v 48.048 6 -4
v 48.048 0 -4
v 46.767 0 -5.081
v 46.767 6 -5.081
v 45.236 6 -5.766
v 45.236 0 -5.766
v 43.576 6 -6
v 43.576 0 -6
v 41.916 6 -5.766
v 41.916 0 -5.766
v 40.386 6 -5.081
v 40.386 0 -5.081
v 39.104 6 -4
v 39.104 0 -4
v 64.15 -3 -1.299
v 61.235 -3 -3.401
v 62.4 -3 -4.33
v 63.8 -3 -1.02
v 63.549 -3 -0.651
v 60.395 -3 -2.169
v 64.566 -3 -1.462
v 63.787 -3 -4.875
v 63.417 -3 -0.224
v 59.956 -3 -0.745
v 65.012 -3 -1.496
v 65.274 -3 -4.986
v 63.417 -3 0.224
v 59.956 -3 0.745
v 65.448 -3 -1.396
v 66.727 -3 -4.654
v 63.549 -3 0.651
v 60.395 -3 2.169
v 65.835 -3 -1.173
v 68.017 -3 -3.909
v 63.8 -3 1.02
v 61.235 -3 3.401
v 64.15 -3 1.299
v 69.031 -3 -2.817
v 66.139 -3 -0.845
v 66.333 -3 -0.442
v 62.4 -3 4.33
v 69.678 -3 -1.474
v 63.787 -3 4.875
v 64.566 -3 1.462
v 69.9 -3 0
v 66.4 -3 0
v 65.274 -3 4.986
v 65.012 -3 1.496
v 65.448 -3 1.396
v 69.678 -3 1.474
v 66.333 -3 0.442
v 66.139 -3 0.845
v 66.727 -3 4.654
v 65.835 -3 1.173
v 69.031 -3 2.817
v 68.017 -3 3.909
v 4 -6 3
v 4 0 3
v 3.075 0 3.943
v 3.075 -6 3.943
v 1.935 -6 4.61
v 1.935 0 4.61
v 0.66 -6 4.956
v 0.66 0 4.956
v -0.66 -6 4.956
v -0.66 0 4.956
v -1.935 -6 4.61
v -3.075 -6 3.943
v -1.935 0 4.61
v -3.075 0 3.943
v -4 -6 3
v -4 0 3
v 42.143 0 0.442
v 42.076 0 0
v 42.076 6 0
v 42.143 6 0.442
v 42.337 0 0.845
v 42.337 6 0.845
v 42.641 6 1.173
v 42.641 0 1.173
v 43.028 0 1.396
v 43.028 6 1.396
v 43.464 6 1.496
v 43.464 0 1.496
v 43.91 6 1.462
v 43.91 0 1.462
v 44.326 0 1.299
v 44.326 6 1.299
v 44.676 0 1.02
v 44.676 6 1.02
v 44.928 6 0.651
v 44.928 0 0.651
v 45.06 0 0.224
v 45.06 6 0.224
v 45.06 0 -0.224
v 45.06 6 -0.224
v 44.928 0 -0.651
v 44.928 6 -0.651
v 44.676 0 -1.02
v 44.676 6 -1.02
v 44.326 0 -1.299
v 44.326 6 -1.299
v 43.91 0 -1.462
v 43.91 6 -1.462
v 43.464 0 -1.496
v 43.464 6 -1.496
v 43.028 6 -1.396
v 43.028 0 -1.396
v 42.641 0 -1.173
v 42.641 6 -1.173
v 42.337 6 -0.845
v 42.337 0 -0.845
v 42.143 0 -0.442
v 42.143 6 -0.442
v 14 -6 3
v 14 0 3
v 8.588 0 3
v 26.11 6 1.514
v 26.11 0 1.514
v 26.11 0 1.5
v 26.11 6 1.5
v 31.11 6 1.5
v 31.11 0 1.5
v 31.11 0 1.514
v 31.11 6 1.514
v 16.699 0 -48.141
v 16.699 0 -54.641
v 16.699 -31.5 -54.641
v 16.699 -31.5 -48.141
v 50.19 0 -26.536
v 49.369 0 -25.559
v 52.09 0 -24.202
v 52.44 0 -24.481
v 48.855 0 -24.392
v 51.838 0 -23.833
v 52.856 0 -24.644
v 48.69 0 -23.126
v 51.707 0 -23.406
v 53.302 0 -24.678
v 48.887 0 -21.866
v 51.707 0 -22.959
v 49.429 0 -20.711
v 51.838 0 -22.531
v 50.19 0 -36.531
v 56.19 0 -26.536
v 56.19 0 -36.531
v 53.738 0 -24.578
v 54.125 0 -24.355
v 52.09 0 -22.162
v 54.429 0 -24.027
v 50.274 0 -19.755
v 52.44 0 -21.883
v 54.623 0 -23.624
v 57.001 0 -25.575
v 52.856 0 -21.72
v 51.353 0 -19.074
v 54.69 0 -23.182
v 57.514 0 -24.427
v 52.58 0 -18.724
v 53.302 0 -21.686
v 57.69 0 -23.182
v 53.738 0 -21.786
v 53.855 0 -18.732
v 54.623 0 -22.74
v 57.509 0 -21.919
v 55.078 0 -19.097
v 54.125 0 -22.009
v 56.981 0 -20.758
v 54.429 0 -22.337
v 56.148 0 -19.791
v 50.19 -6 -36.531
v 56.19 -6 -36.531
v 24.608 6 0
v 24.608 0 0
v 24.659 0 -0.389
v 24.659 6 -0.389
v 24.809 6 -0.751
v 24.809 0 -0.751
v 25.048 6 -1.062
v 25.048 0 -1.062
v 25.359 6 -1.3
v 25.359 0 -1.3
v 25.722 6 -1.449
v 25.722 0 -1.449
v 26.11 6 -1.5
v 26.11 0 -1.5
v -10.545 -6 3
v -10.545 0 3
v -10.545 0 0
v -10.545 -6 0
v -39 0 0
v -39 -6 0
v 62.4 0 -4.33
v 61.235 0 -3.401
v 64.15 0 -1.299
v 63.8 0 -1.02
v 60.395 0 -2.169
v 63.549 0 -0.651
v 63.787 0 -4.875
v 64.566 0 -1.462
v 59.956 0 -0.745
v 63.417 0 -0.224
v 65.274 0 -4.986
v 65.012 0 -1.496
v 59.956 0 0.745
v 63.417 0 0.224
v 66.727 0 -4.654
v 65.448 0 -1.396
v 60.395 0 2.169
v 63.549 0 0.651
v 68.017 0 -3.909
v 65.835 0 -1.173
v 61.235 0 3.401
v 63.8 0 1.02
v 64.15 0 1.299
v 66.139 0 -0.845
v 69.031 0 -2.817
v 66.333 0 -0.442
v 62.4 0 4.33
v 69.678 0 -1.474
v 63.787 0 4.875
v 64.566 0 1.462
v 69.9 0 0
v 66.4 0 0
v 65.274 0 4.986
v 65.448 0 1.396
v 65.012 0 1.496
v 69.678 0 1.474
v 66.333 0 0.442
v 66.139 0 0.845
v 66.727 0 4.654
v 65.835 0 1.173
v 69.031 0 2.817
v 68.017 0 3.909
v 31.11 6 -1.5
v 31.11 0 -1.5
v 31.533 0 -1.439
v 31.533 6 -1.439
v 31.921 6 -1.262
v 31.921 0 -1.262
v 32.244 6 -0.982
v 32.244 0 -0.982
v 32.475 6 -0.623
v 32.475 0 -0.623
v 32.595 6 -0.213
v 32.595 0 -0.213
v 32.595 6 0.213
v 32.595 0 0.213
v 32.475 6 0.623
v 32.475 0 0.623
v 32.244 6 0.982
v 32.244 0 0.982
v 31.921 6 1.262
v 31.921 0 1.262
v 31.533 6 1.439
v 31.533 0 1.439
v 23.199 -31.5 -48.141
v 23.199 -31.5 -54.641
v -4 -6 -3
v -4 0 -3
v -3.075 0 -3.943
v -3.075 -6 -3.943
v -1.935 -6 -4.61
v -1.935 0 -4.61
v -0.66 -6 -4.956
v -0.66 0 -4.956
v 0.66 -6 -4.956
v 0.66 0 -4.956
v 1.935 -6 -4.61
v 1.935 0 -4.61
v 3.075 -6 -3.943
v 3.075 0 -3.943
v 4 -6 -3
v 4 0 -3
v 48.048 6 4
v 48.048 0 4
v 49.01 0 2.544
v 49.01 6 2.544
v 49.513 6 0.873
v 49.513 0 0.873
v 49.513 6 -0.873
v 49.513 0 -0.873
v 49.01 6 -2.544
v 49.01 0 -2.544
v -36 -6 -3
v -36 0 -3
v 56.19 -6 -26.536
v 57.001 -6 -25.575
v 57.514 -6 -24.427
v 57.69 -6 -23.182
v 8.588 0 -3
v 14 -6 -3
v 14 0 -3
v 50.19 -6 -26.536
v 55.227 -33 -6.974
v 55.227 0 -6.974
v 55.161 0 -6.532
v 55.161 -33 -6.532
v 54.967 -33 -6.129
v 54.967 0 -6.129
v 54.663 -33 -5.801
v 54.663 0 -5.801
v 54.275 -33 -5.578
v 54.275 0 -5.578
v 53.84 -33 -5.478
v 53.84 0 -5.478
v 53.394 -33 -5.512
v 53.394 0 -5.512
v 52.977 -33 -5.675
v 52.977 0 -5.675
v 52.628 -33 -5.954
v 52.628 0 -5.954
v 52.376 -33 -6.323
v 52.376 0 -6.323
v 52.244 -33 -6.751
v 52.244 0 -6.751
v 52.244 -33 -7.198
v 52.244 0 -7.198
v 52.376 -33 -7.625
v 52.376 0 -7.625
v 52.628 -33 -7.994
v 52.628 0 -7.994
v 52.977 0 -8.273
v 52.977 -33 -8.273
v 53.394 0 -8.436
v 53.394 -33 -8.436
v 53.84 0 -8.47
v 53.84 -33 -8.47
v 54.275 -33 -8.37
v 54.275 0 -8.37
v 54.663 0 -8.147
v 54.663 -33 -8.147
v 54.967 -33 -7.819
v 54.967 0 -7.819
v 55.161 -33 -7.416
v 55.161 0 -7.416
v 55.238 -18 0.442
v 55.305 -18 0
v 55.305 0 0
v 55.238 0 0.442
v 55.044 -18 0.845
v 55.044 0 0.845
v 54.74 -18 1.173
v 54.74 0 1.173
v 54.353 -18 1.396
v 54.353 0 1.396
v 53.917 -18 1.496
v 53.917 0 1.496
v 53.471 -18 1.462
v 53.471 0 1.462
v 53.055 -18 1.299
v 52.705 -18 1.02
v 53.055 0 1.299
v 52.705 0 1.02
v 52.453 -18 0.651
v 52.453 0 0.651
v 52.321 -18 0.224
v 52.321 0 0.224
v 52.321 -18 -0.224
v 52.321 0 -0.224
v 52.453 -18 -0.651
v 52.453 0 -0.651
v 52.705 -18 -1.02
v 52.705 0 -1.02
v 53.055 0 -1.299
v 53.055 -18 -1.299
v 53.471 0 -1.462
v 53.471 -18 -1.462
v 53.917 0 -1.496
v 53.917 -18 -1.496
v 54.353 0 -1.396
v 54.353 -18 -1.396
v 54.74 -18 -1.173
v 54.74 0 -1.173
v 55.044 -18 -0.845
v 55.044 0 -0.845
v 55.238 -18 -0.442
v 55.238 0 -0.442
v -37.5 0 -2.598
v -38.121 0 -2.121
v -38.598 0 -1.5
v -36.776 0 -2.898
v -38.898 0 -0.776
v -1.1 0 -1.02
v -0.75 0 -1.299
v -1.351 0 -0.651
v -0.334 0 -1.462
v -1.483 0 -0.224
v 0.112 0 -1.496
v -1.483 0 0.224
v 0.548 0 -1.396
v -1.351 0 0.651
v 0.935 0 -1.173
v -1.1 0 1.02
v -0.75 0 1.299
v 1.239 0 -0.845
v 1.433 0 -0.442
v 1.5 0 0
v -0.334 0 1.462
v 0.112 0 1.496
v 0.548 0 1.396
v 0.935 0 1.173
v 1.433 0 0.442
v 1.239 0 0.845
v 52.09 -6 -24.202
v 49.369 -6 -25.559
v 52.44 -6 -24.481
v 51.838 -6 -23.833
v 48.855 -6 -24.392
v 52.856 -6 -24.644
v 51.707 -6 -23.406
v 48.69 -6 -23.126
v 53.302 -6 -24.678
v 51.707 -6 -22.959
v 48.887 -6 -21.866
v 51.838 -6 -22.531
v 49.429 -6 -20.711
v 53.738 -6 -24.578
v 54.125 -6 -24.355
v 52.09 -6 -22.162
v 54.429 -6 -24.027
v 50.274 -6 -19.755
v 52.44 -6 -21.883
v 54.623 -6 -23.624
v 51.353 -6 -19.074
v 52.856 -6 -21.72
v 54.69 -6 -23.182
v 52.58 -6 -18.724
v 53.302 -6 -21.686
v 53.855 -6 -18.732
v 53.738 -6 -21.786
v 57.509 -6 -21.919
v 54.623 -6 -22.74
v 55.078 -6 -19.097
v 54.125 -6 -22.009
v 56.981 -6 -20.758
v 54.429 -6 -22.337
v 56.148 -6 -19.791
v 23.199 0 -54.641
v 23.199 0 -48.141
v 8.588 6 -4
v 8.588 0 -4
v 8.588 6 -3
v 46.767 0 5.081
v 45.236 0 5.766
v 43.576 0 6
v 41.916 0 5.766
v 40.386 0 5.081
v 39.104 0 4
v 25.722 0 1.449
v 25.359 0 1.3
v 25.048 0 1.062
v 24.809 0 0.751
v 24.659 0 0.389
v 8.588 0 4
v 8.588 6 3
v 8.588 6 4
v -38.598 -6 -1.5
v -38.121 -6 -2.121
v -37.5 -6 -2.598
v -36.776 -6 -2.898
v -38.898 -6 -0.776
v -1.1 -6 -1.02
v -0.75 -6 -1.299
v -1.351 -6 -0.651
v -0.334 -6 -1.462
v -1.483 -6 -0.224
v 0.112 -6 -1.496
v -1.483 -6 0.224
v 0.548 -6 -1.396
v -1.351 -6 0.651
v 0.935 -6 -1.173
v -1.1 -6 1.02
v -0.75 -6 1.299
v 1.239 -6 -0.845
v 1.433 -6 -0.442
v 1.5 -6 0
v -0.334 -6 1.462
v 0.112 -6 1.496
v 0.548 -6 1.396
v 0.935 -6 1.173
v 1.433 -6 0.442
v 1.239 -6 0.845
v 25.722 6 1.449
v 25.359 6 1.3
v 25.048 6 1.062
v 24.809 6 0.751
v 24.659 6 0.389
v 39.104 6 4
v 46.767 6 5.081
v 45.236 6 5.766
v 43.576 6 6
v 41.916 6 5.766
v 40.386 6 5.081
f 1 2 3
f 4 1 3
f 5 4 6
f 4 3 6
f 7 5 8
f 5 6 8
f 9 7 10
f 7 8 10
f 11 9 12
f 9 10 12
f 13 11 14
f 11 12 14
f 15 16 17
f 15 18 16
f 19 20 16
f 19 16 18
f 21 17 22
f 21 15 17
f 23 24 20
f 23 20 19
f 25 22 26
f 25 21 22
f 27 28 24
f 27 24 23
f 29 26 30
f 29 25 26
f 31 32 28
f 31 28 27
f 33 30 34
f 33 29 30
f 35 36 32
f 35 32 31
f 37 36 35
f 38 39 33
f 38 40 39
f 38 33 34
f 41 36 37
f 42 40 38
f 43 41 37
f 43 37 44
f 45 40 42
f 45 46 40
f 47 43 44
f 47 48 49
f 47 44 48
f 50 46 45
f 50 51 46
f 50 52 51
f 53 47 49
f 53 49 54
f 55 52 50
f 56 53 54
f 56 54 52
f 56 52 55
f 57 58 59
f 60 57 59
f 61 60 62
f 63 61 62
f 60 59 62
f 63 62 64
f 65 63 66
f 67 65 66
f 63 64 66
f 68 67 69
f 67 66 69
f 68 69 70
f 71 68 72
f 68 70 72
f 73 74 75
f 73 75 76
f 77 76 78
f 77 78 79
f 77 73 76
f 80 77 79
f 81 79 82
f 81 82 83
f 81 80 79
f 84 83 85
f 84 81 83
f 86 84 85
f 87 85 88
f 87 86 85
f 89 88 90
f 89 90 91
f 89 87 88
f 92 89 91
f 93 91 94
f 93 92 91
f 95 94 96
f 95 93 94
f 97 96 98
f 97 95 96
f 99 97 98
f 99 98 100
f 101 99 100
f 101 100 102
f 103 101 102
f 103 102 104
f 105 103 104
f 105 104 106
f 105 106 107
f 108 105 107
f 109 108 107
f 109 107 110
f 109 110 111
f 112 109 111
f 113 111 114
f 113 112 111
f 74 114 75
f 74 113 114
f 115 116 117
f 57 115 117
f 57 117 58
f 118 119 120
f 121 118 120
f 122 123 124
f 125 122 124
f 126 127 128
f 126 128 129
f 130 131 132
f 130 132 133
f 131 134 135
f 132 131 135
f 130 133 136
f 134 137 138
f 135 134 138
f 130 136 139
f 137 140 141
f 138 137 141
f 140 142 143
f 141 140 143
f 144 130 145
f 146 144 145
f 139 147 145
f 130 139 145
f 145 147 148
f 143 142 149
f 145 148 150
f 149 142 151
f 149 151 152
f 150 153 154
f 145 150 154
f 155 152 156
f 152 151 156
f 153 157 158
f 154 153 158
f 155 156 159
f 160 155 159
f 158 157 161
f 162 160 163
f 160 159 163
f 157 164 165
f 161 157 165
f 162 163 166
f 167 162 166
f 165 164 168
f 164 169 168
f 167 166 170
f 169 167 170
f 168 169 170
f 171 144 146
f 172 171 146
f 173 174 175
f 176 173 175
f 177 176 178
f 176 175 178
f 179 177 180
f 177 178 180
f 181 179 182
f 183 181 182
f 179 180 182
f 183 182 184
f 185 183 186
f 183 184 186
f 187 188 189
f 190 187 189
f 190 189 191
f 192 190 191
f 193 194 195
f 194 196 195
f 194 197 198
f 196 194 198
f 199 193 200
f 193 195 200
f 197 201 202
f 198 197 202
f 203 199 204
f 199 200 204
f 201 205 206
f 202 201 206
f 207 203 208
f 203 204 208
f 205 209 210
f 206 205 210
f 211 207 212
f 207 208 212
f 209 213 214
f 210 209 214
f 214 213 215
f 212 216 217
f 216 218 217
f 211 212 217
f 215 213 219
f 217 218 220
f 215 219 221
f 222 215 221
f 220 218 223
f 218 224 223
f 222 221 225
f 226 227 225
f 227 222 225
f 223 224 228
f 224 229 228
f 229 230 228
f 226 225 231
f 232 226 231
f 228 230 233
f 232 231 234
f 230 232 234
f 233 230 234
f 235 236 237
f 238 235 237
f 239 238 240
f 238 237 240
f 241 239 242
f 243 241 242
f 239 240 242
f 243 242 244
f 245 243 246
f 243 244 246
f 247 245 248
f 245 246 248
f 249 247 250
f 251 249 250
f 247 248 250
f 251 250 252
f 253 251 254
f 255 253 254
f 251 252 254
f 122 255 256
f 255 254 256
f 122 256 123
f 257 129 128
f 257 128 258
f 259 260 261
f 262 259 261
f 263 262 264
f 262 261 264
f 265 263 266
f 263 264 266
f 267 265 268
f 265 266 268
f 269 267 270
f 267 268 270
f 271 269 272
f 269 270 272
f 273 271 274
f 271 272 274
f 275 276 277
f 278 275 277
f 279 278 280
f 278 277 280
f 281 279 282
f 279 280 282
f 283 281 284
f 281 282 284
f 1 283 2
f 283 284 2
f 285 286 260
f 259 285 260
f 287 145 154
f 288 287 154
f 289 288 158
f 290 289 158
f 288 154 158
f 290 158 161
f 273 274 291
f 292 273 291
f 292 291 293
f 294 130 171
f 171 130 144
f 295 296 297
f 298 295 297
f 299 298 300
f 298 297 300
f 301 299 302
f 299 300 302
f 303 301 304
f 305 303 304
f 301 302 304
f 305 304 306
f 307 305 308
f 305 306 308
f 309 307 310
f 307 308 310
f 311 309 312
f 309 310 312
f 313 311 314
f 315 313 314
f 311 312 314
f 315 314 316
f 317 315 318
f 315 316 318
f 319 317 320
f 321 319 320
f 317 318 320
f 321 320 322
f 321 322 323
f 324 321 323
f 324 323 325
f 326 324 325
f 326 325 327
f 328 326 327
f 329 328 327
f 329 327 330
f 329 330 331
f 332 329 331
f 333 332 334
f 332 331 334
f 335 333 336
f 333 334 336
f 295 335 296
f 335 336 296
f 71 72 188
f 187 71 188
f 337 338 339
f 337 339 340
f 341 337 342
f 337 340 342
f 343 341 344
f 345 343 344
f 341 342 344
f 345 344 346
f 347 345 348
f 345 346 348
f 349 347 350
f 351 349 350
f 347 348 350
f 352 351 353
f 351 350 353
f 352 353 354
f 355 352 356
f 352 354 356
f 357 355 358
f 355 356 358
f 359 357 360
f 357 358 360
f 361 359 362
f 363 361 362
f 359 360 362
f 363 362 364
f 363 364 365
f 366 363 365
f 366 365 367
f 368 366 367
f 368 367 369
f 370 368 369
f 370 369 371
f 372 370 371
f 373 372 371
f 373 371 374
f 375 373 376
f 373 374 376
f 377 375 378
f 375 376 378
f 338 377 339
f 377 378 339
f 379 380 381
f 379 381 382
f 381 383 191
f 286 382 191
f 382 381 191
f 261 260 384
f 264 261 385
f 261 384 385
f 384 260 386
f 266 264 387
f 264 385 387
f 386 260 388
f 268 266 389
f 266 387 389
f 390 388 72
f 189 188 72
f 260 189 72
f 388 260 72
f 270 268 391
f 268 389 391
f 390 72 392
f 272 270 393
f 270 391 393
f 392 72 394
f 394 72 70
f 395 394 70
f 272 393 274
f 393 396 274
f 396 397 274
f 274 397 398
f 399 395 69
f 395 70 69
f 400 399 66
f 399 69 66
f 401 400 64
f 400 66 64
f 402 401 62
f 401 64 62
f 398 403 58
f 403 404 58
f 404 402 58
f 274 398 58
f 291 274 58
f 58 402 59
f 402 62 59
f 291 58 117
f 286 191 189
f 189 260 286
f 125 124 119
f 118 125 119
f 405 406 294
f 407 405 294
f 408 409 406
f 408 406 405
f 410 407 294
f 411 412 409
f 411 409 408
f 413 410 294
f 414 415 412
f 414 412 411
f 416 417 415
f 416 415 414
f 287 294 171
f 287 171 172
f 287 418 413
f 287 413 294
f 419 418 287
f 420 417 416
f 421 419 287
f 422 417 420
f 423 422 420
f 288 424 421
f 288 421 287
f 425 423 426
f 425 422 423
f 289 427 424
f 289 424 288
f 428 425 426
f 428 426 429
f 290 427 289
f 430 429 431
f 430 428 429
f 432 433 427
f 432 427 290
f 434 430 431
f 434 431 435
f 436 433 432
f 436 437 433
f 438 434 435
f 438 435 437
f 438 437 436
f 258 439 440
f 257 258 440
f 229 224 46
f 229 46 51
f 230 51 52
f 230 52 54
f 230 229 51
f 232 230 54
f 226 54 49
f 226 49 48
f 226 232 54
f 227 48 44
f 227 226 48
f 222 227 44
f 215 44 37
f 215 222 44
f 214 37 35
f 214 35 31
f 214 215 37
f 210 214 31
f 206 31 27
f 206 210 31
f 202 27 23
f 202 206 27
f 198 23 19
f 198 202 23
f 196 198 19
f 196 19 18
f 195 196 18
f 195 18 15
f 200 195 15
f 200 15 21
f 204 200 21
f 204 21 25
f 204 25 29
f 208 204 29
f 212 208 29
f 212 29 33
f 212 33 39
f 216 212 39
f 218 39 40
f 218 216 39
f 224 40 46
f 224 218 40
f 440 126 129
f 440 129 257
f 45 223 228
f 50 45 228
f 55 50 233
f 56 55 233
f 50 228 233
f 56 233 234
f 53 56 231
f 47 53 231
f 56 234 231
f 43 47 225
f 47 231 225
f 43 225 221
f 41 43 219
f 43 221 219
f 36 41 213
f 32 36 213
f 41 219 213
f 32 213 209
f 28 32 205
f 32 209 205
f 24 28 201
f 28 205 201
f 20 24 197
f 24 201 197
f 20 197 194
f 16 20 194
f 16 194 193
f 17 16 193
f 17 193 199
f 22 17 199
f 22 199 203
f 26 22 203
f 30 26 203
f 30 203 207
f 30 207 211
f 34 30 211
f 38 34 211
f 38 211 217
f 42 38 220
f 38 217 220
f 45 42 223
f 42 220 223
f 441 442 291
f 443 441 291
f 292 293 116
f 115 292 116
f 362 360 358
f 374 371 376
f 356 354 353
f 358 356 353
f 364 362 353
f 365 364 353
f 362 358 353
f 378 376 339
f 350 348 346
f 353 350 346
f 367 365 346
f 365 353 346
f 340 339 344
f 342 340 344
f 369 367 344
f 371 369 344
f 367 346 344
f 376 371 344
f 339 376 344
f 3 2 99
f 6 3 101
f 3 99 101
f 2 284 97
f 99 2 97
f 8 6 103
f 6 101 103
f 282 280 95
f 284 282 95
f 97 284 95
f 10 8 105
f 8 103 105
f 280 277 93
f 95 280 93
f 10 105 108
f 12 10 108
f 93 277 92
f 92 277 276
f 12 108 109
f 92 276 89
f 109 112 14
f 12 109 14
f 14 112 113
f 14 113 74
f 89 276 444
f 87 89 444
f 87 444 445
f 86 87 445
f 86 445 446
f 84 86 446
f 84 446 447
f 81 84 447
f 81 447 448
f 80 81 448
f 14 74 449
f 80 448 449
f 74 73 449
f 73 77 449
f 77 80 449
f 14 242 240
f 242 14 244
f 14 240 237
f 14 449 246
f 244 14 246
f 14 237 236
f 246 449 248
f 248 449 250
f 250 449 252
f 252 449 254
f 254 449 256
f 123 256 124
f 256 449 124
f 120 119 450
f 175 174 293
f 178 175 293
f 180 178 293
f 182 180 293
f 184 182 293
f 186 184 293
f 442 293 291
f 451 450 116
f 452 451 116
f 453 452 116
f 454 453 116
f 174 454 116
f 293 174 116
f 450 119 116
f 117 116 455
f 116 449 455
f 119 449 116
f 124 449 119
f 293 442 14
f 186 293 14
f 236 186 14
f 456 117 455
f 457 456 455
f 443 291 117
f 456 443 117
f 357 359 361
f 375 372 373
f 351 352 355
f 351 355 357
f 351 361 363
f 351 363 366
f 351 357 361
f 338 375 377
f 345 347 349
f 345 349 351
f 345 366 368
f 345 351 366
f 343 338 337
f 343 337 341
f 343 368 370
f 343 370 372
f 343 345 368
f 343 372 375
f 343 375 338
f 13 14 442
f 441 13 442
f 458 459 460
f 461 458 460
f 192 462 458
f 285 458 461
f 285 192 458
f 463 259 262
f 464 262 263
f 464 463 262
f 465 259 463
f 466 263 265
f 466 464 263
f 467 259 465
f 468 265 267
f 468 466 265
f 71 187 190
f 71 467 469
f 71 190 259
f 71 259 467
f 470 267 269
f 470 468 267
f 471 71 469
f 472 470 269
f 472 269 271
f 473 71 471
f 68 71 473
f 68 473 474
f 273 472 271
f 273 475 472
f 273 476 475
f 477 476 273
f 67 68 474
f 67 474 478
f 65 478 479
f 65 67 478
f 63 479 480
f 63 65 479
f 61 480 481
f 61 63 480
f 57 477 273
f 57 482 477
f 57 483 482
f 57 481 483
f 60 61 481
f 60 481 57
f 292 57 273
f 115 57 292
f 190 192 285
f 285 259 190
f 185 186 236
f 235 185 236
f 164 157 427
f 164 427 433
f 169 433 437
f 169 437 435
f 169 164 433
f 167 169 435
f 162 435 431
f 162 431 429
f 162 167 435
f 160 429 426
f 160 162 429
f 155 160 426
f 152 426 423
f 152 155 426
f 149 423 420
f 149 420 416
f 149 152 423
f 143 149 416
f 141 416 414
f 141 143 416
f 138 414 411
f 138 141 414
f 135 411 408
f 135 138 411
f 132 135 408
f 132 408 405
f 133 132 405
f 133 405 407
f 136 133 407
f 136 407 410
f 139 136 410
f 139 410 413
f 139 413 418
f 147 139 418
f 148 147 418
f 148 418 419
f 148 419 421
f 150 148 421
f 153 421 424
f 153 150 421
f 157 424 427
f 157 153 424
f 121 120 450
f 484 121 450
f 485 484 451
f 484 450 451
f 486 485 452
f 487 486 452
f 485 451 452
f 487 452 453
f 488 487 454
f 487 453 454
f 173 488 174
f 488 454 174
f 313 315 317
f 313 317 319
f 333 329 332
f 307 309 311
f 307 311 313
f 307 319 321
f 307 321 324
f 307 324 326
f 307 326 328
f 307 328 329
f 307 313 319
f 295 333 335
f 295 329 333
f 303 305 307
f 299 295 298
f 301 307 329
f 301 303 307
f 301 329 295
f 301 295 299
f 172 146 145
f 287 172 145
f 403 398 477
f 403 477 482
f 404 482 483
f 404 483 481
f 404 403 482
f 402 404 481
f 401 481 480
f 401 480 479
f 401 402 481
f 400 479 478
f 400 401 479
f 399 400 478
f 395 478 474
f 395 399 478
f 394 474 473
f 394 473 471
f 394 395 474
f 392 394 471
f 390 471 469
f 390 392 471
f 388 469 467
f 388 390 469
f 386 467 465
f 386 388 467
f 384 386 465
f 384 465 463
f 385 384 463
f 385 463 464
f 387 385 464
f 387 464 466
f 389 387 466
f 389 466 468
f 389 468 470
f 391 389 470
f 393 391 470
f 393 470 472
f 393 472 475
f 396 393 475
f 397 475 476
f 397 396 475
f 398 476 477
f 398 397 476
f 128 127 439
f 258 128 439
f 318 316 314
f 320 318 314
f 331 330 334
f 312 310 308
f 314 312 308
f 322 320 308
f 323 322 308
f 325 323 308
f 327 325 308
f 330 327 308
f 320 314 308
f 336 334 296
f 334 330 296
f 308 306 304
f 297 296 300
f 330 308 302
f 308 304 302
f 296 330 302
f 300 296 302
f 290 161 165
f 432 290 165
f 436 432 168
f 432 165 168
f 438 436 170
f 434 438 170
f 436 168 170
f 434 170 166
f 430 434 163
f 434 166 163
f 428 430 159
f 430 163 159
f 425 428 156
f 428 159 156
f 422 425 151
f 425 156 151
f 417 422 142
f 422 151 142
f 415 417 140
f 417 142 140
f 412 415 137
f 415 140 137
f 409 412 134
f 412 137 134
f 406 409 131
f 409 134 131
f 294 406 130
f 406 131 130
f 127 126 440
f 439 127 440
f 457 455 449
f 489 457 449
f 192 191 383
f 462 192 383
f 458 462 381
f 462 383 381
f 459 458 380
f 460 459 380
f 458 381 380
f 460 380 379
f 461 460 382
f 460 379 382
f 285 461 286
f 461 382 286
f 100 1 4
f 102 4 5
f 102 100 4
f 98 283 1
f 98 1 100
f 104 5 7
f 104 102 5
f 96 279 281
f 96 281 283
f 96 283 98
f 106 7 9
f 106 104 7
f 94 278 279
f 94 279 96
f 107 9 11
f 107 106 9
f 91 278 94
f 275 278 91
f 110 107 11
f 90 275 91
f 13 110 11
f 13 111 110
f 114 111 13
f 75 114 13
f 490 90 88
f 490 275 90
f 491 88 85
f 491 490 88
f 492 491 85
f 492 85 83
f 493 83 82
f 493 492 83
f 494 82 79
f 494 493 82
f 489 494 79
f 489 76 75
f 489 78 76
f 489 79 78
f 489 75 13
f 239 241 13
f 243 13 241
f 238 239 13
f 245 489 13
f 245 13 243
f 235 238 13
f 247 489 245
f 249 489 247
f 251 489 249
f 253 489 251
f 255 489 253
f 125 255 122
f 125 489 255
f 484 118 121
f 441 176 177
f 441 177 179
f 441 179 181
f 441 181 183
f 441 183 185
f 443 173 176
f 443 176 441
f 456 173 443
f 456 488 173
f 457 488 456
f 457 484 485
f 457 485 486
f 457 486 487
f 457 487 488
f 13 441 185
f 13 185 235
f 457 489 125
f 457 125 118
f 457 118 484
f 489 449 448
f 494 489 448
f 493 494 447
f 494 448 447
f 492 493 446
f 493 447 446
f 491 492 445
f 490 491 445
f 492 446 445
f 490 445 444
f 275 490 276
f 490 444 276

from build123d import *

# Parameters (mm, degrees)
F0_R      = 1.5
F1_DEPTH  = 6
F2_R      = 1.5
F2_W      = 5.4118521512
F2_H      = 6
F3_DEPTH  = 6
F4_R      = 5
F4_R_2    = 1.5
F5_DEPTH  = 3
F6_R      = 1.5
F7_DEPTH  = 18
F8_R      = 1.5
F9_DEPTH  = 33
F10_R     = 1.5
F10_W     = 6
F10_H     = 6
F11_DEPTH = 6
F12_DEPTH = 6
F13_W     = 6.5
F13_H     = 6.5
F14_DEPTH = 31.5


# Not quite as in the source:
# - ends of sketch curves that miss each other by under 0.0002 mm in the source are joined


with BuildPart() as f1:
    # F0 (on Front) → F1 (new body)
    with BuildSketch(Plane.XZ):
        with BuildLine():
            ThreePointArc((3.9999999804, -3.0000000261), (4.7434164851, -1.5811388455), (5, 0))
            ThreePointArc((5, 0), (4.7434164917, 1.5811388258), (4.0000000055, 2.9999999927))
            Line((3.9999999804, 2.9999999739), (3.9999999804, -3.0000000261))
        make_face()
        with BuildLine():
            ThreePointArc((4.0000000055, 2.9999999927), (4.7434164917, 1.5811388258), (5, 0))
            ThreePointArc((5, 0), (4.7434164851, -1.5811388455), (3.9999999804, -3.0000000261))
            Line((3.9999999804, -3.0000000261), (13.9999999804, -3.0000000261))
            Line((13.9999999804, -3.0000000261), (13.9999999804, 2.9999999739))
            Line((13.9999999804, 2.9999999739), (3.9999999804, 2.9999999739))
        make_face()
        with BuildLine():
            Line((3.9999999804, -3.0000000261), (3.9999999804, 2.9999999739))
            ThreePointArc((4.0000000055, 2.9999999927), (2.09e-08, 5), (-3.9999999804, 3.0000000261))
            Line((-3.9999999804, 3.0000000261), (-3.9999999804, -3.0000000261))
            ThreePointArc((-3.9999999804, -3.0000000261), (0, -5), (3.9999999804, -3.0000000261))
        make_face()
        Circle(F0_R, mode=Mode.SUBTRACT)
        with BuildLine():
            Line((-3.9999999804, -3.0000000261), (-3.9999999804, 3.0000000261))
            ThreePointArc((-3.9999999804, 3.0000000261), (-5, 0), (-3.9999999804, -3.0000000261))
        make_face()
        with BuildLine():
            ThreePointArc((-3.9999999804, -3.0000000261), (-5, 0), (-3.9999999804, 3.0000000261))
            Line((-3.9999999804, 3.0000000261), (-10.545078665, 3.0000000261))
            Line((-10.545078665, 3.0000000261), (-10.545078665, 0))
            Line((-10.545078665, 0), (-38.9999999804, 0))
            ThreePointArc((-38.9999999804, -2.61e-08), (-38.121320324, -2.1213203696), (-35.9999999804, -3.0000000261))
            Line((-35.9999999804, -3.0000000261), (-3.9999999804, -3.0000000261))
        make_face()
    extrude(amount=F1_DEPTH)

    # F2 (on face) → F3 (join)
    with BuildSketch(Plane(origin=(0, 0, 0), x_dir=(-1, 0, 0), z_dir=(0, 1, 0))):
        with BuildLine():
            ThreePointArc((-39.1041604406, 3.9999999739), (-43.5762964189, 6), (-48.0484323972, 3.9999999739))
            Line((-48.0484323972, 3.9999999739), (-39.1041604406, 3.9999999739))
        make_face()
        with BuildLine():
            Line((-39.1041606338, -4.00000019), (-48.048432204, -4.00000019))
            ThreePointArc((-48.048432204, -4.00000019), (-43.5762964189, -6), (-39.1041606338, -4.00000019))
        make_face()
        with BuildLine():
            Line((-39.1041604406, 3.9999999739), (-48.0484323972, 3.9999999739))
            ThreePointArc((-48.0484323972, 3.9999999739), (-49.5762964189, -1.449e-07), (-48.048432204, -4.00000019))
            Line((-48.048432204, -4.00000019), (-39.1041606338, -4.00000019))
            ThreePointArc((-39.1041606338, -4.00000019), (-37.9712623106, -2.1409326577), (-37.5762964189, 0))
            ThreePointArc((-37.5762964189, 0), (-37.9712622589, 2.1409325223), (-39.1041604406, 3.9999999739))
        make_face()
        with Locations((-43.5762964189, 0)):
            Circle(F2_R, mode=Mode.SUBTRACT)
        with Locations((-11.2940739049, -2.61e-08)):
            Rectangle(F2_W, F2_H)
        with BuildLine():
            Line((-8.5881474018, 3.9999999739), (-39.1041604406, 3.9999999739))
            ThreePointArc((-39.1041604406, 3.9999999739), (-37.9712622589, 2.1409325223), (-37.5762964189, 0))
            ThreePointArc((-37.5762964189, 0), (-37.9712623106, -2.1409326577), (-39.1041606338, -4.00000019))
            Line((-39.1041606338, -4.00000019), (-14.5881475508, -4.00000019))
            Line((-14.5881475508, -4.00000019), (-8.5881474018, -4.00000019))
            Line((-8.5881474018, -4.00000019), (-8.5881478293, -3.0000000261))
            Line((-8.5881478293, -3.0000000261), (-13.9999999804, -3.0000000261))
            Line((-13.9999999804, -3.0000000261), (-13.9999999804, 2.9999999739))
            Line((-13.9999999804, 2.9999999739), (-8.5881478293, 2.9999999739))
            Line((-8.5881478293, 2.9999999739), (-8.5881474018, 3.9999999739))
        make_face()
        with BuildLine():
            ThreePointArc((-24.6078900066, 1.33e-08), (-25.048135537, -1.061565088), (-26.1104506254, -1.4999978011))
            Line((-26.1104506254, -1.4999978011), (-31.1104506254, -1.4999978011))
            ThreePointArc((-31.1104506254, -1.4999978011), (-32.6104506254, 0), (-31.1104506254, 1.5))
            Line((-31.1104506254, 1.5), (-31.1104506254, 1.5137138676))
            Line((-31.1104506254, 1.5137138676), (-26.1104506254, 1.5137138676))
            Line((-26.1104506254, 1.5137138676), (-26.1104506254, 1.4999978277))
            ThreePointArc((-26.1104506254, 1.4999978277), (-25.048135537, 1.0615651145), (-24.6078900066, 1.33e-08))
        make_face(mode=Mode.SUBTRACT)
    extrude(amount=F3_DEPTH)


with BuildPart() as f5:
    # F4 (on Front) → F5 (new body)
    with BuildSketch(Plane.XZ):
        with Locations((64.899995923, 0)):
            Circle(F4_R)
        with Locations((64.899995923, 0)):
            Circle(F4_R_2, mode=Mode.SUBTRACT)
    extrude(amount=F5_DEPTH)


with BuildPart() as f7:
    # F6 (on Front) → F7 (new body)
    with BuildSketch(Plane.XZ):
        with Locations((53.8045093417, 0)):
            Circle(F6_R)
    extrude(amount=F7_DEPTH)


with BuildPart() as f9:
    # F8 (on Front) → F9 (new body)
    with BuildSketch(Plane.XZ):
        with Locations((53.7274181843, -6.9740889594)):
            Circle(F8_R)
    extrude(amount=F9_DEPTH)


with BuildPart() as f11:
    # F10 (on Front) → F11 (new body)
    with BuildSketch(Plane.XZ):
        with BuildLine():
            ThreePointArc((56.1898760498, -26.5361675613), (57.2977955124, -25.0191827928), (57.6898764372, -23.1820652485))
            ThreePointArc((57.6898764372, -23.1820652485), (51.3527593674, -19.0741459611), (50.1898760498, -26.5361668682))
            Line((50.1898760498, -26.5361668682), (50.1898760498, -26.5308583975))
            Line((50.1898760498, -26.5308583975), (56.1898760498, -26.5308583975))
            Line((56.1898760498, -26.5308583975), (56.1898760498, -26.5361675613))
        make_face()
        with Locations((53.1898764372, -23.1820652485)):
            Circle(F10_R, mode=Mode.SUBTRACT)
        with BuildLine():
            Line((50.1898760498, -26.5308583975), (50.1898760498, -26.5361668682))
            ThreePointArc((50.1898760498, -26.5361668682), (53.1898759174, -27.6820652485), (56.1898760498, -26.5361675613))
            Line((56.1898760498, -26.5361675613), (56.1898760498, -26.5308583975))
            Line((56.1898760498, -26.5308583975), (50.1898760498, -26.5308583975))
        make_face()
        with BuildLine():
            ThreePointArc((56.1898760498, -26.5361675613), (53.1898759174, -27.6820652485), (50.1898760498, -26.5361668682))
            Line((50.1898760498, -26.5361668682), (50.1898760498, -30.5308583975))
            Line((50.1898760498, -30.5308583975), (56.1898760498, -30.5308583975))
            Line((56.1898760498, -30.5308583975), (56.1898760498, -26.5361675613))
        make_face()
        with Locations((53.1898760498, -33.5308583975)):
            Rectangle(F10_W, F10_H)
    extrude(amount=F11_DEPTH)

    # F10 (on Front) → F12 (join)
    with BuildSketch(Plane.XZ):
        with BuildLine():
            ThreePointArc((56.1898760498, -26.5361675613), (57.2977955124, -25.0191827928), (57.6898764372, -23.1820652485))
            ThreePointArc((57.6898764372, -23.1820652485), (51.3527593674, -19.0741459611), (50.1898760498, -26.5361668682))
            Line((50.1898760498, -26.5361668682), (50.1898760498, -26.5308583975))
            Line((50.1898760498, -26.5308583975), (56.1898760498, -26.5308583975))
            Line((56.1898760498, -26.5308583975), (56.1898760498, -26.5361675613))
        make_face()
        with Locations((53.1898764372, -23.1820652485)):
            Circle(F10_R, mode=Mode.SUBTRACT)
        with BuildLine():
            Line((50.1898760498, -26.5308583975), (50.1898760498, -26.5361668682))
            ThreePointArc((50.1898760498, -26.5361668682), (53.1898759174, -27.6820652485), (56.1898760498, -26.5361675613))
            Line((56.1898760498, -26.5361675613), (56.1898760498, -26.5308583975))
            Line((56.1898760498, -26.5308583975), (50.1898760498, -26.5308583975))
        make_face()
        with BuildLine():
            ThreePointArc((56.1898760498, -26.5361675613), (53.1898759174, -27.6820652485), (50.1898760498, -26.5361668682))
            Line((50.1898760498, -26.5361668682), (50.1898760498, -30.5308583975))
            Line((50.1898760498, -30.5308583975), (56.1898760498, -30.5308583975))
            Line((56.1898760498, -30.5308583975), (56.1898760498, -26.5361675613))
        make_face()
        with Locations((53.1898760498, -33.5308583975)):
            Rectangle(F10_W, F10_H)
    extrude(amount=F12_DEPTH)


with BuildPart() as f14:
    # F13 (on Front) → F14 (new body)
    with BuildSketch(Plane.XZ):
        with Locations((19.9485578835, -51.390840739)):
            Rectangle(F13_W, F13_H)
    extrude(amount=F14_DEPTH)


solid = Compound([f1.part, f5.part, f7.part, f9.part, f11.part, f14.part])
